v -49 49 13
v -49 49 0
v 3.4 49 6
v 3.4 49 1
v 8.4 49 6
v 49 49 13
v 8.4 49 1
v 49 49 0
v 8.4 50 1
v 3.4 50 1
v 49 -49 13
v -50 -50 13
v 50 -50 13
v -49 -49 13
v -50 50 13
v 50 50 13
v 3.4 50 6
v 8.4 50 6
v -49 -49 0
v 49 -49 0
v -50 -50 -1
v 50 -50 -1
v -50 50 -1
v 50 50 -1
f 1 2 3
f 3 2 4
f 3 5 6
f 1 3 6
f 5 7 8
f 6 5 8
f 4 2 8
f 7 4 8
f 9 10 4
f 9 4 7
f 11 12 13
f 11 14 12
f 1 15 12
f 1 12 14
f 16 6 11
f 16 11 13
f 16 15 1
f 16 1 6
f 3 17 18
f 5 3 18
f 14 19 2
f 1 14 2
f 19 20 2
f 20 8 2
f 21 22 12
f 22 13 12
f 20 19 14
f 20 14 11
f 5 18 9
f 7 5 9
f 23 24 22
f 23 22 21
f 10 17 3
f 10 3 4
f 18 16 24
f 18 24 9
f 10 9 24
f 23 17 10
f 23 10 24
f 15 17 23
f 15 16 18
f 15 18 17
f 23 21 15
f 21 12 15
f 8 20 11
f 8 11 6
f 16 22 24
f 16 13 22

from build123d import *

# Parameters (mm, degrees)
SKETCH1_W           = 100
SKETCH1_H           = 100
SKETCH1_W_2         = 98
SKETCH1_H_2         = 98
BOSS_EXTRUDE1_DEPTH = 13
SKETCH2_W           = 100
SKETCH2_H           = 100
BOSS_EXTRUDE2_DEPTH = 1
SKETCH3_W           = 5
SKETCH3_H           = 5
CUT_EXTRUDE1_DEPTH  = 2


with BuildPart() as part:
    # Sketch1 → Boss-Extrude1 (new body)
    with BuildSketch(Plane.XY):
        Rectangle(SKETCH1_W, SKETCH1_H)
        Rectangle(SKETCH1_W_2, SKETCH1_H_2, mode=Mode.SUBTRACT)
    extrude(amount=BOSS_EXTRUDE1_DEPTH)

    # Sketch2 → Boss-Extrude2 (add)
    with BuildSketch(Plane(origin=(0, 0, 0), x_dir=(-1, 0, 0), z_dir=(0, 0, -1))):
        Rectangle(SKETCH2_W, SKETCH2_H)
    extrude(amount=BOSS_EXTRUDE2_DEPTH)

    # Sketch3 → Cut-Extrude1 (cut)
    with BuildSketch(Plane(origin=(0, 50, 0), x_dir=(1, 0, 0), z_dir=(0, 1, 0))):
        with Locations((5.9, -3.5)):
            Rectangle(SKETCH3_W, SKETCH3_H)
    extrude(amount=-CUT_EXTRUDE1_DEPTH, mode=Mode.SUBTRACT)


solid = part.part
